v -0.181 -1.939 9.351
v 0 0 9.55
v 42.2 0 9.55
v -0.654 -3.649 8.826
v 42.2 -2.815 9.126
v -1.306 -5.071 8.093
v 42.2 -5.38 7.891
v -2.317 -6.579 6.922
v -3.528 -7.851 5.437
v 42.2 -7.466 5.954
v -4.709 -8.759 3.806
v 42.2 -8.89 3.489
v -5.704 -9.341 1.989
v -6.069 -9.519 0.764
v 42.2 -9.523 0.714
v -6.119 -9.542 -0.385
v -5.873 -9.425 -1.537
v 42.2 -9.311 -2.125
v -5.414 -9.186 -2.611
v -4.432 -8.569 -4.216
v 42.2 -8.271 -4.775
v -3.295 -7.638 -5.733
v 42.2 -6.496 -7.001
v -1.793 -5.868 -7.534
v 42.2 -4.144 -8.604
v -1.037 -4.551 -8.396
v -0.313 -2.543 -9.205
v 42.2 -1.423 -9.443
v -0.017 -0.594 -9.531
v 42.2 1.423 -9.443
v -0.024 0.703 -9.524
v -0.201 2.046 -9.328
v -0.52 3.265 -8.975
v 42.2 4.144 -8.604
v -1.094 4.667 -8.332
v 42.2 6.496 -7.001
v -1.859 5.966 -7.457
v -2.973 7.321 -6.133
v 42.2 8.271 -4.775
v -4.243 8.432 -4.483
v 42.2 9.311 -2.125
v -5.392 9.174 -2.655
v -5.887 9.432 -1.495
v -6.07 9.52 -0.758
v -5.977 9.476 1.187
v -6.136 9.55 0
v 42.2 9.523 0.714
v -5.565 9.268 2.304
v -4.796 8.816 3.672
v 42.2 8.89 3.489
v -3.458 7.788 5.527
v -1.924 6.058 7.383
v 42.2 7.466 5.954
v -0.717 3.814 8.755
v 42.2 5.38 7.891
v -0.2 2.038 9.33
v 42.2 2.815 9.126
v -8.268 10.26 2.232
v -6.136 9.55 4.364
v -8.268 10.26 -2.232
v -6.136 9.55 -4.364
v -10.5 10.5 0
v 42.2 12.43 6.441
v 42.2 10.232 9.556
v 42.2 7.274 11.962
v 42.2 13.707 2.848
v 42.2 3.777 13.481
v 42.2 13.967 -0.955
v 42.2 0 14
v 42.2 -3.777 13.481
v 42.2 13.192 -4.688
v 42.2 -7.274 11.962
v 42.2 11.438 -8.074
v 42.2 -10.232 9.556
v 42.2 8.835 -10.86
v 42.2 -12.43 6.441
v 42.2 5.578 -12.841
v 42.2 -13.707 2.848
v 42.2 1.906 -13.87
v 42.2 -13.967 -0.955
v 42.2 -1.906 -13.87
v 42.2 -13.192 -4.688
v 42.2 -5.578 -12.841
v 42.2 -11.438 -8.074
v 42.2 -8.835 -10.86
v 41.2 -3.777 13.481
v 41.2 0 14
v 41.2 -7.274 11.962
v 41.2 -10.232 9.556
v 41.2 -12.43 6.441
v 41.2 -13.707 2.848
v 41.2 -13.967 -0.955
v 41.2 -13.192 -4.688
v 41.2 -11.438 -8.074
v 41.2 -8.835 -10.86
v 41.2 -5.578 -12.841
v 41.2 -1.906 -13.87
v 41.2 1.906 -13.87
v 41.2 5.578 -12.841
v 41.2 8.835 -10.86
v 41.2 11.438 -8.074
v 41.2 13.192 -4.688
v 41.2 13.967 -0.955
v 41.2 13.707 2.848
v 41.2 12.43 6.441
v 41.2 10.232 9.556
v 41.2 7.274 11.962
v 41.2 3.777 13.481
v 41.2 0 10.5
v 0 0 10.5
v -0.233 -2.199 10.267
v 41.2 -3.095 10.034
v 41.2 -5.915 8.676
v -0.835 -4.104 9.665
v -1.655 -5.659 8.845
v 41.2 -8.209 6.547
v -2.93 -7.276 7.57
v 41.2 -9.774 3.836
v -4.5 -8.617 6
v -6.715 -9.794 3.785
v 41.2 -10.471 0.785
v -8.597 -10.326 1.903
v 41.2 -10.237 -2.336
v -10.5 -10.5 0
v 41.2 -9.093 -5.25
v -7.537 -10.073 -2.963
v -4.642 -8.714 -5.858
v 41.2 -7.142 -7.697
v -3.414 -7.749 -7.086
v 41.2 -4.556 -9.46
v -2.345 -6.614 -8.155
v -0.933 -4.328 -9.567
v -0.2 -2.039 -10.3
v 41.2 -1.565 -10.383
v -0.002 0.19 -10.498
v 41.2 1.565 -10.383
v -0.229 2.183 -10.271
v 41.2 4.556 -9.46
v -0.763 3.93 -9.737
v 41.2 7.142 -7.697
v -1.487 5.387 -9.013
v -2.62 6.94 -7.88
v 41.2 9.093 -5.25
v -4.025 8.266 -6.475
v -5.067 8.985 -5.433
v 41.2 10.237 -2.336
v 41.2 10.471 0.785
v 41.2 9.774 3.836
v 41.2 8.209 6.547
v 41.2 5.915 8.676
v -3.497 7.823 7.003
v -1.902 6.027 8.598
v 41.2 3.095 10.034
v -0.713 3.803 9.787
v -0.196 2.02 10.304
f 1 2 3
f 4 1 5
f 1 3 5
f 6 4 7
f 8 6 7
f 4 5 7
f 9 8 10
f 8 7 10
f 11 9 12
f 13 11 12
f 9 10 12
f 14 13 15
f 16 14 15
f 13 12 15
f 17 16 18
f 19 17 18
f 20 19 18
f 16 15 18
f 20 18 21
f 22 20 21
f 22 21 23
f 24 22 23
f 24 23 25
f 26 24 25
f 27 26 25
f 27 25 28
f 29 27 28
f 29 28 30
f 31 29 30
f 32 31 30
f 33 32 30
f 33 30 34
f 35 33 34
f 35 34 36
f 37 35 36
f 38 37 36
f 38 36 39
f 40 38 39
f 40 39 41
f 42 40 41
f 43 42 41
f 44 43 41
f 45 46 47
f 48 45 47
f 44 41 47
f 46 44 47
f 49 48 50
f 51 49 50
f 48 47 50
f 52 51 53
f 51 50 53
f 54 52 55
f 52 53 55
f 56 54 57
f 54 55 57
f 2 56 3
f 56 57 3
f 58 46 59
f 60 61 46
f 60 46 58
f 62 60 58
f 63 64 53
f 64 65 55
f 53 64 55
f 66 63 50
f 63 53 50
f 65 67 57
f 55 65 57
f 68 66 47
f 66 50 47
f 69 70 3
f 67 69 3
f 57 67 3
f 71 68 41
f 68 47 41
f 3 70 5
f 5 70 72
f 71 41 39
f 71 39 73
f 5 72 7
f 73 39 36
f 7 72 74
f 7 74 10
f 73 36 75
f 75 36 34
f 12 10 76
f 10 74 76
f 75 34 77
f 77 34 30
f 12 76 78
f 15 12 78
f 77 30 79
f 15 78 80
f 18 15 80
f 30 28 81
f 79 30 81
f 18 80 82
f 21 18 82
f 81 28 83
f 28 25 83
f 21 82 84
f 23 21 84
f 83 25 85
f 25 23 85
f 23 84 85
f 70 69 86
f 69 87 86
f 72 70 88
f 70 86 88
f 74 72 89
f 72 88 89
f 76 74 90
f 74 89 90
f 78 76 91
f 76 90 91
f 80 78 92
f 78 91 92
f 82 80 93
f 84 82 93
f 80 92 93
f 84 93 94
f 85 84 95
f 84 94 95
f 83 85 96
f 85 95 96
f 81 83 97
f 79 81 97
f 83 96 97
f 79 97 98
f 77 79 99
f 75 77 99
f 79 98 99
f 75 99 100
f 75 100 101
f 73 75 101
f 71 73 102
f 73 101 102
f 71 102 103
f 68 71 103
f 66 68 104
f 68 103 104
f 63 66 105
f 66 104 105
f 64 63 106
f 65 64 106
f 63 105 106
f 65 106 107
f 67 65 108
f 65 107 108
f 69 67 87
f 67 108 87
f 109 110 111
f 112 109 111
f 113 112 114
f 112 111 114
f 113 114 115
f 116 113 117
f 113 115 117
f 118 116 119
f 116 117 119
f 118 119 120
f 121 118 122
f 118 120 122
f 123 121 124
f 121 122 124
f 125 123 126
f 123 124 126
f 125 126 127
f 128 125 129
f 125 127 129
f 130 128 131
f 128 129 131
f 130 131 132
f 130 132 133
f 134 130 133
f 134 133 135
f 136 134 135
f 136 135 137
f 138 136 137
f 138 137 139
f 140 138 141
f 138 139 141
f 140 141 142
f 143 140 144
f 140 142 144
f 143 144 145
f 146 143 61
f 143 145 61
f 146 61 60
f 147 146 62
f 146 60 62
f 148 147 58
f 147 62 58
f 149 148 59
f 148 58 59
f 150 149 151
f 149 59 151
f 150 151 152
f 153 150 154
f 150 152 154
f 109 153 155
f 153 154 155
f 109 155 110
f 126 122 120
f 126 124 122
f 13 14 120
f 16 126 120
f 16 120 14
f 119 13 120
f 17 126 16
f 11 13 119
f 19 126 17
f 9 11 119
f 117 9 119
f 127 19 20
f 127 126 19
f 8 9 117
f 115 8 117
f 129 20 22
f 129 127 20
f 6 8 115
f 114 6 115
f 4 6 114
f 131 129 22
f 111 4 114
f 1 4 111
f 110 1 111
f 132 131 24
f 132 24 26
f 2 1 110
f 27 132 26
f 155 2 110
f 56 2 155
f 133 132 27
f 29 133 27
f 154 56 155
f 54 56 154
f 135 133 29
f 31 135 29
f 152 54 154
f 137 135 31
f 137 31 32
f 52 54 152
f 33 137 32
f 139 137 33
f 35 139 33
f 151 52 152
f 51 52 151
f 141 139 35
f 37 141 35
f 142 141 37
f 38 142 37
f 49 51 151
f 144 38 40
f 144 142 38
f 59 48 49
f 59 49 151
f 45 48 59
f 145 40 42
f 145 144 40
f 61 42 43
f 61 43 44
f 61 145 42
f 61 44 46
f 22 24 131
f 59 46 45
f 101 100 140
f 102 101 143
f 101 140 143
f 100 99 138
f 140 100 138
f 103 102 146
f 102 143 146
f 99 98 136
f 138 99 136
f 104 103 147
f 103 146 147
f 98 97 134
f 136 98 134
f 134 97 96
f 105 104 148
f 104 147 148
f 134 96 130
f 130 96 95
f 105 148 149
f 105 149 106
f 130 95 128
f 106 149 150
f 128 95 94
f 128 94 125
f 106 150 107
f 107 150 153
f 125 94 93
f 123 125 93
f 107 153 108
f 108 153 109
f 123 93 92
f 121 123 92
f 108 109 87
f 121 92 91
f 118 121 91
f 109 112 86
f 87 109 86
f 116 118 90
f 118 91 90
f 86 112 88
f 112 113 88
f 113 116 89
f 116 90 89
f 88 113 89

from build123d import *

# Parameters (mm, degrees)
CUT_EXTRUDE1_DEPTH      = 47.613731882
CUT_EXTRUDE1_DEPTH_BACK = 47.613731882


with BuildPart() as part:
    # Sketch1 → Revolve1 (revolve)
    with BuildSketch(Plane.XY):
        with BuildLine():
            Line((41.2, 10.5), (-10.5, 10.5))
            ThreePointArc((-10.5, 10.5), (-8.266728857, 10.259751459), (-6.135655834, 9.55))
            Line((-6.135655834, 9.55), (42.2, 9.55))
            Line((42.2, 9.55), (42.2, 14))
            Line((42.2, 14), (41.2, 14))
            Line((41.2, 14), (41.2, 10.5))
        make_face()
    revolve(axis=Axis((0, 0, 0), (1, 0, 0)))

    # Sketch1<3> → Cut-Extrude1 (cut, two sides: drawn at the far end of the back side and taken through both)
    with BuildSketch(Plane.XY.offset(-CUT_EXTRUDE1_DEPTH_BACK)):
        with BuildLine():
            ThreePointArc((-10.5, -10.5), (0, 0), (-10.5, 10.5))
            Line((-10.5, 10.5), (-10.5, -10.5))
        make_face()
    extrude(amount=CUT_EXTRUDE1_DEPTH + CUT_EXTRUDE1_DEPTH_BACK, mode=Mode.SUBTRACT)


solid = part.part
